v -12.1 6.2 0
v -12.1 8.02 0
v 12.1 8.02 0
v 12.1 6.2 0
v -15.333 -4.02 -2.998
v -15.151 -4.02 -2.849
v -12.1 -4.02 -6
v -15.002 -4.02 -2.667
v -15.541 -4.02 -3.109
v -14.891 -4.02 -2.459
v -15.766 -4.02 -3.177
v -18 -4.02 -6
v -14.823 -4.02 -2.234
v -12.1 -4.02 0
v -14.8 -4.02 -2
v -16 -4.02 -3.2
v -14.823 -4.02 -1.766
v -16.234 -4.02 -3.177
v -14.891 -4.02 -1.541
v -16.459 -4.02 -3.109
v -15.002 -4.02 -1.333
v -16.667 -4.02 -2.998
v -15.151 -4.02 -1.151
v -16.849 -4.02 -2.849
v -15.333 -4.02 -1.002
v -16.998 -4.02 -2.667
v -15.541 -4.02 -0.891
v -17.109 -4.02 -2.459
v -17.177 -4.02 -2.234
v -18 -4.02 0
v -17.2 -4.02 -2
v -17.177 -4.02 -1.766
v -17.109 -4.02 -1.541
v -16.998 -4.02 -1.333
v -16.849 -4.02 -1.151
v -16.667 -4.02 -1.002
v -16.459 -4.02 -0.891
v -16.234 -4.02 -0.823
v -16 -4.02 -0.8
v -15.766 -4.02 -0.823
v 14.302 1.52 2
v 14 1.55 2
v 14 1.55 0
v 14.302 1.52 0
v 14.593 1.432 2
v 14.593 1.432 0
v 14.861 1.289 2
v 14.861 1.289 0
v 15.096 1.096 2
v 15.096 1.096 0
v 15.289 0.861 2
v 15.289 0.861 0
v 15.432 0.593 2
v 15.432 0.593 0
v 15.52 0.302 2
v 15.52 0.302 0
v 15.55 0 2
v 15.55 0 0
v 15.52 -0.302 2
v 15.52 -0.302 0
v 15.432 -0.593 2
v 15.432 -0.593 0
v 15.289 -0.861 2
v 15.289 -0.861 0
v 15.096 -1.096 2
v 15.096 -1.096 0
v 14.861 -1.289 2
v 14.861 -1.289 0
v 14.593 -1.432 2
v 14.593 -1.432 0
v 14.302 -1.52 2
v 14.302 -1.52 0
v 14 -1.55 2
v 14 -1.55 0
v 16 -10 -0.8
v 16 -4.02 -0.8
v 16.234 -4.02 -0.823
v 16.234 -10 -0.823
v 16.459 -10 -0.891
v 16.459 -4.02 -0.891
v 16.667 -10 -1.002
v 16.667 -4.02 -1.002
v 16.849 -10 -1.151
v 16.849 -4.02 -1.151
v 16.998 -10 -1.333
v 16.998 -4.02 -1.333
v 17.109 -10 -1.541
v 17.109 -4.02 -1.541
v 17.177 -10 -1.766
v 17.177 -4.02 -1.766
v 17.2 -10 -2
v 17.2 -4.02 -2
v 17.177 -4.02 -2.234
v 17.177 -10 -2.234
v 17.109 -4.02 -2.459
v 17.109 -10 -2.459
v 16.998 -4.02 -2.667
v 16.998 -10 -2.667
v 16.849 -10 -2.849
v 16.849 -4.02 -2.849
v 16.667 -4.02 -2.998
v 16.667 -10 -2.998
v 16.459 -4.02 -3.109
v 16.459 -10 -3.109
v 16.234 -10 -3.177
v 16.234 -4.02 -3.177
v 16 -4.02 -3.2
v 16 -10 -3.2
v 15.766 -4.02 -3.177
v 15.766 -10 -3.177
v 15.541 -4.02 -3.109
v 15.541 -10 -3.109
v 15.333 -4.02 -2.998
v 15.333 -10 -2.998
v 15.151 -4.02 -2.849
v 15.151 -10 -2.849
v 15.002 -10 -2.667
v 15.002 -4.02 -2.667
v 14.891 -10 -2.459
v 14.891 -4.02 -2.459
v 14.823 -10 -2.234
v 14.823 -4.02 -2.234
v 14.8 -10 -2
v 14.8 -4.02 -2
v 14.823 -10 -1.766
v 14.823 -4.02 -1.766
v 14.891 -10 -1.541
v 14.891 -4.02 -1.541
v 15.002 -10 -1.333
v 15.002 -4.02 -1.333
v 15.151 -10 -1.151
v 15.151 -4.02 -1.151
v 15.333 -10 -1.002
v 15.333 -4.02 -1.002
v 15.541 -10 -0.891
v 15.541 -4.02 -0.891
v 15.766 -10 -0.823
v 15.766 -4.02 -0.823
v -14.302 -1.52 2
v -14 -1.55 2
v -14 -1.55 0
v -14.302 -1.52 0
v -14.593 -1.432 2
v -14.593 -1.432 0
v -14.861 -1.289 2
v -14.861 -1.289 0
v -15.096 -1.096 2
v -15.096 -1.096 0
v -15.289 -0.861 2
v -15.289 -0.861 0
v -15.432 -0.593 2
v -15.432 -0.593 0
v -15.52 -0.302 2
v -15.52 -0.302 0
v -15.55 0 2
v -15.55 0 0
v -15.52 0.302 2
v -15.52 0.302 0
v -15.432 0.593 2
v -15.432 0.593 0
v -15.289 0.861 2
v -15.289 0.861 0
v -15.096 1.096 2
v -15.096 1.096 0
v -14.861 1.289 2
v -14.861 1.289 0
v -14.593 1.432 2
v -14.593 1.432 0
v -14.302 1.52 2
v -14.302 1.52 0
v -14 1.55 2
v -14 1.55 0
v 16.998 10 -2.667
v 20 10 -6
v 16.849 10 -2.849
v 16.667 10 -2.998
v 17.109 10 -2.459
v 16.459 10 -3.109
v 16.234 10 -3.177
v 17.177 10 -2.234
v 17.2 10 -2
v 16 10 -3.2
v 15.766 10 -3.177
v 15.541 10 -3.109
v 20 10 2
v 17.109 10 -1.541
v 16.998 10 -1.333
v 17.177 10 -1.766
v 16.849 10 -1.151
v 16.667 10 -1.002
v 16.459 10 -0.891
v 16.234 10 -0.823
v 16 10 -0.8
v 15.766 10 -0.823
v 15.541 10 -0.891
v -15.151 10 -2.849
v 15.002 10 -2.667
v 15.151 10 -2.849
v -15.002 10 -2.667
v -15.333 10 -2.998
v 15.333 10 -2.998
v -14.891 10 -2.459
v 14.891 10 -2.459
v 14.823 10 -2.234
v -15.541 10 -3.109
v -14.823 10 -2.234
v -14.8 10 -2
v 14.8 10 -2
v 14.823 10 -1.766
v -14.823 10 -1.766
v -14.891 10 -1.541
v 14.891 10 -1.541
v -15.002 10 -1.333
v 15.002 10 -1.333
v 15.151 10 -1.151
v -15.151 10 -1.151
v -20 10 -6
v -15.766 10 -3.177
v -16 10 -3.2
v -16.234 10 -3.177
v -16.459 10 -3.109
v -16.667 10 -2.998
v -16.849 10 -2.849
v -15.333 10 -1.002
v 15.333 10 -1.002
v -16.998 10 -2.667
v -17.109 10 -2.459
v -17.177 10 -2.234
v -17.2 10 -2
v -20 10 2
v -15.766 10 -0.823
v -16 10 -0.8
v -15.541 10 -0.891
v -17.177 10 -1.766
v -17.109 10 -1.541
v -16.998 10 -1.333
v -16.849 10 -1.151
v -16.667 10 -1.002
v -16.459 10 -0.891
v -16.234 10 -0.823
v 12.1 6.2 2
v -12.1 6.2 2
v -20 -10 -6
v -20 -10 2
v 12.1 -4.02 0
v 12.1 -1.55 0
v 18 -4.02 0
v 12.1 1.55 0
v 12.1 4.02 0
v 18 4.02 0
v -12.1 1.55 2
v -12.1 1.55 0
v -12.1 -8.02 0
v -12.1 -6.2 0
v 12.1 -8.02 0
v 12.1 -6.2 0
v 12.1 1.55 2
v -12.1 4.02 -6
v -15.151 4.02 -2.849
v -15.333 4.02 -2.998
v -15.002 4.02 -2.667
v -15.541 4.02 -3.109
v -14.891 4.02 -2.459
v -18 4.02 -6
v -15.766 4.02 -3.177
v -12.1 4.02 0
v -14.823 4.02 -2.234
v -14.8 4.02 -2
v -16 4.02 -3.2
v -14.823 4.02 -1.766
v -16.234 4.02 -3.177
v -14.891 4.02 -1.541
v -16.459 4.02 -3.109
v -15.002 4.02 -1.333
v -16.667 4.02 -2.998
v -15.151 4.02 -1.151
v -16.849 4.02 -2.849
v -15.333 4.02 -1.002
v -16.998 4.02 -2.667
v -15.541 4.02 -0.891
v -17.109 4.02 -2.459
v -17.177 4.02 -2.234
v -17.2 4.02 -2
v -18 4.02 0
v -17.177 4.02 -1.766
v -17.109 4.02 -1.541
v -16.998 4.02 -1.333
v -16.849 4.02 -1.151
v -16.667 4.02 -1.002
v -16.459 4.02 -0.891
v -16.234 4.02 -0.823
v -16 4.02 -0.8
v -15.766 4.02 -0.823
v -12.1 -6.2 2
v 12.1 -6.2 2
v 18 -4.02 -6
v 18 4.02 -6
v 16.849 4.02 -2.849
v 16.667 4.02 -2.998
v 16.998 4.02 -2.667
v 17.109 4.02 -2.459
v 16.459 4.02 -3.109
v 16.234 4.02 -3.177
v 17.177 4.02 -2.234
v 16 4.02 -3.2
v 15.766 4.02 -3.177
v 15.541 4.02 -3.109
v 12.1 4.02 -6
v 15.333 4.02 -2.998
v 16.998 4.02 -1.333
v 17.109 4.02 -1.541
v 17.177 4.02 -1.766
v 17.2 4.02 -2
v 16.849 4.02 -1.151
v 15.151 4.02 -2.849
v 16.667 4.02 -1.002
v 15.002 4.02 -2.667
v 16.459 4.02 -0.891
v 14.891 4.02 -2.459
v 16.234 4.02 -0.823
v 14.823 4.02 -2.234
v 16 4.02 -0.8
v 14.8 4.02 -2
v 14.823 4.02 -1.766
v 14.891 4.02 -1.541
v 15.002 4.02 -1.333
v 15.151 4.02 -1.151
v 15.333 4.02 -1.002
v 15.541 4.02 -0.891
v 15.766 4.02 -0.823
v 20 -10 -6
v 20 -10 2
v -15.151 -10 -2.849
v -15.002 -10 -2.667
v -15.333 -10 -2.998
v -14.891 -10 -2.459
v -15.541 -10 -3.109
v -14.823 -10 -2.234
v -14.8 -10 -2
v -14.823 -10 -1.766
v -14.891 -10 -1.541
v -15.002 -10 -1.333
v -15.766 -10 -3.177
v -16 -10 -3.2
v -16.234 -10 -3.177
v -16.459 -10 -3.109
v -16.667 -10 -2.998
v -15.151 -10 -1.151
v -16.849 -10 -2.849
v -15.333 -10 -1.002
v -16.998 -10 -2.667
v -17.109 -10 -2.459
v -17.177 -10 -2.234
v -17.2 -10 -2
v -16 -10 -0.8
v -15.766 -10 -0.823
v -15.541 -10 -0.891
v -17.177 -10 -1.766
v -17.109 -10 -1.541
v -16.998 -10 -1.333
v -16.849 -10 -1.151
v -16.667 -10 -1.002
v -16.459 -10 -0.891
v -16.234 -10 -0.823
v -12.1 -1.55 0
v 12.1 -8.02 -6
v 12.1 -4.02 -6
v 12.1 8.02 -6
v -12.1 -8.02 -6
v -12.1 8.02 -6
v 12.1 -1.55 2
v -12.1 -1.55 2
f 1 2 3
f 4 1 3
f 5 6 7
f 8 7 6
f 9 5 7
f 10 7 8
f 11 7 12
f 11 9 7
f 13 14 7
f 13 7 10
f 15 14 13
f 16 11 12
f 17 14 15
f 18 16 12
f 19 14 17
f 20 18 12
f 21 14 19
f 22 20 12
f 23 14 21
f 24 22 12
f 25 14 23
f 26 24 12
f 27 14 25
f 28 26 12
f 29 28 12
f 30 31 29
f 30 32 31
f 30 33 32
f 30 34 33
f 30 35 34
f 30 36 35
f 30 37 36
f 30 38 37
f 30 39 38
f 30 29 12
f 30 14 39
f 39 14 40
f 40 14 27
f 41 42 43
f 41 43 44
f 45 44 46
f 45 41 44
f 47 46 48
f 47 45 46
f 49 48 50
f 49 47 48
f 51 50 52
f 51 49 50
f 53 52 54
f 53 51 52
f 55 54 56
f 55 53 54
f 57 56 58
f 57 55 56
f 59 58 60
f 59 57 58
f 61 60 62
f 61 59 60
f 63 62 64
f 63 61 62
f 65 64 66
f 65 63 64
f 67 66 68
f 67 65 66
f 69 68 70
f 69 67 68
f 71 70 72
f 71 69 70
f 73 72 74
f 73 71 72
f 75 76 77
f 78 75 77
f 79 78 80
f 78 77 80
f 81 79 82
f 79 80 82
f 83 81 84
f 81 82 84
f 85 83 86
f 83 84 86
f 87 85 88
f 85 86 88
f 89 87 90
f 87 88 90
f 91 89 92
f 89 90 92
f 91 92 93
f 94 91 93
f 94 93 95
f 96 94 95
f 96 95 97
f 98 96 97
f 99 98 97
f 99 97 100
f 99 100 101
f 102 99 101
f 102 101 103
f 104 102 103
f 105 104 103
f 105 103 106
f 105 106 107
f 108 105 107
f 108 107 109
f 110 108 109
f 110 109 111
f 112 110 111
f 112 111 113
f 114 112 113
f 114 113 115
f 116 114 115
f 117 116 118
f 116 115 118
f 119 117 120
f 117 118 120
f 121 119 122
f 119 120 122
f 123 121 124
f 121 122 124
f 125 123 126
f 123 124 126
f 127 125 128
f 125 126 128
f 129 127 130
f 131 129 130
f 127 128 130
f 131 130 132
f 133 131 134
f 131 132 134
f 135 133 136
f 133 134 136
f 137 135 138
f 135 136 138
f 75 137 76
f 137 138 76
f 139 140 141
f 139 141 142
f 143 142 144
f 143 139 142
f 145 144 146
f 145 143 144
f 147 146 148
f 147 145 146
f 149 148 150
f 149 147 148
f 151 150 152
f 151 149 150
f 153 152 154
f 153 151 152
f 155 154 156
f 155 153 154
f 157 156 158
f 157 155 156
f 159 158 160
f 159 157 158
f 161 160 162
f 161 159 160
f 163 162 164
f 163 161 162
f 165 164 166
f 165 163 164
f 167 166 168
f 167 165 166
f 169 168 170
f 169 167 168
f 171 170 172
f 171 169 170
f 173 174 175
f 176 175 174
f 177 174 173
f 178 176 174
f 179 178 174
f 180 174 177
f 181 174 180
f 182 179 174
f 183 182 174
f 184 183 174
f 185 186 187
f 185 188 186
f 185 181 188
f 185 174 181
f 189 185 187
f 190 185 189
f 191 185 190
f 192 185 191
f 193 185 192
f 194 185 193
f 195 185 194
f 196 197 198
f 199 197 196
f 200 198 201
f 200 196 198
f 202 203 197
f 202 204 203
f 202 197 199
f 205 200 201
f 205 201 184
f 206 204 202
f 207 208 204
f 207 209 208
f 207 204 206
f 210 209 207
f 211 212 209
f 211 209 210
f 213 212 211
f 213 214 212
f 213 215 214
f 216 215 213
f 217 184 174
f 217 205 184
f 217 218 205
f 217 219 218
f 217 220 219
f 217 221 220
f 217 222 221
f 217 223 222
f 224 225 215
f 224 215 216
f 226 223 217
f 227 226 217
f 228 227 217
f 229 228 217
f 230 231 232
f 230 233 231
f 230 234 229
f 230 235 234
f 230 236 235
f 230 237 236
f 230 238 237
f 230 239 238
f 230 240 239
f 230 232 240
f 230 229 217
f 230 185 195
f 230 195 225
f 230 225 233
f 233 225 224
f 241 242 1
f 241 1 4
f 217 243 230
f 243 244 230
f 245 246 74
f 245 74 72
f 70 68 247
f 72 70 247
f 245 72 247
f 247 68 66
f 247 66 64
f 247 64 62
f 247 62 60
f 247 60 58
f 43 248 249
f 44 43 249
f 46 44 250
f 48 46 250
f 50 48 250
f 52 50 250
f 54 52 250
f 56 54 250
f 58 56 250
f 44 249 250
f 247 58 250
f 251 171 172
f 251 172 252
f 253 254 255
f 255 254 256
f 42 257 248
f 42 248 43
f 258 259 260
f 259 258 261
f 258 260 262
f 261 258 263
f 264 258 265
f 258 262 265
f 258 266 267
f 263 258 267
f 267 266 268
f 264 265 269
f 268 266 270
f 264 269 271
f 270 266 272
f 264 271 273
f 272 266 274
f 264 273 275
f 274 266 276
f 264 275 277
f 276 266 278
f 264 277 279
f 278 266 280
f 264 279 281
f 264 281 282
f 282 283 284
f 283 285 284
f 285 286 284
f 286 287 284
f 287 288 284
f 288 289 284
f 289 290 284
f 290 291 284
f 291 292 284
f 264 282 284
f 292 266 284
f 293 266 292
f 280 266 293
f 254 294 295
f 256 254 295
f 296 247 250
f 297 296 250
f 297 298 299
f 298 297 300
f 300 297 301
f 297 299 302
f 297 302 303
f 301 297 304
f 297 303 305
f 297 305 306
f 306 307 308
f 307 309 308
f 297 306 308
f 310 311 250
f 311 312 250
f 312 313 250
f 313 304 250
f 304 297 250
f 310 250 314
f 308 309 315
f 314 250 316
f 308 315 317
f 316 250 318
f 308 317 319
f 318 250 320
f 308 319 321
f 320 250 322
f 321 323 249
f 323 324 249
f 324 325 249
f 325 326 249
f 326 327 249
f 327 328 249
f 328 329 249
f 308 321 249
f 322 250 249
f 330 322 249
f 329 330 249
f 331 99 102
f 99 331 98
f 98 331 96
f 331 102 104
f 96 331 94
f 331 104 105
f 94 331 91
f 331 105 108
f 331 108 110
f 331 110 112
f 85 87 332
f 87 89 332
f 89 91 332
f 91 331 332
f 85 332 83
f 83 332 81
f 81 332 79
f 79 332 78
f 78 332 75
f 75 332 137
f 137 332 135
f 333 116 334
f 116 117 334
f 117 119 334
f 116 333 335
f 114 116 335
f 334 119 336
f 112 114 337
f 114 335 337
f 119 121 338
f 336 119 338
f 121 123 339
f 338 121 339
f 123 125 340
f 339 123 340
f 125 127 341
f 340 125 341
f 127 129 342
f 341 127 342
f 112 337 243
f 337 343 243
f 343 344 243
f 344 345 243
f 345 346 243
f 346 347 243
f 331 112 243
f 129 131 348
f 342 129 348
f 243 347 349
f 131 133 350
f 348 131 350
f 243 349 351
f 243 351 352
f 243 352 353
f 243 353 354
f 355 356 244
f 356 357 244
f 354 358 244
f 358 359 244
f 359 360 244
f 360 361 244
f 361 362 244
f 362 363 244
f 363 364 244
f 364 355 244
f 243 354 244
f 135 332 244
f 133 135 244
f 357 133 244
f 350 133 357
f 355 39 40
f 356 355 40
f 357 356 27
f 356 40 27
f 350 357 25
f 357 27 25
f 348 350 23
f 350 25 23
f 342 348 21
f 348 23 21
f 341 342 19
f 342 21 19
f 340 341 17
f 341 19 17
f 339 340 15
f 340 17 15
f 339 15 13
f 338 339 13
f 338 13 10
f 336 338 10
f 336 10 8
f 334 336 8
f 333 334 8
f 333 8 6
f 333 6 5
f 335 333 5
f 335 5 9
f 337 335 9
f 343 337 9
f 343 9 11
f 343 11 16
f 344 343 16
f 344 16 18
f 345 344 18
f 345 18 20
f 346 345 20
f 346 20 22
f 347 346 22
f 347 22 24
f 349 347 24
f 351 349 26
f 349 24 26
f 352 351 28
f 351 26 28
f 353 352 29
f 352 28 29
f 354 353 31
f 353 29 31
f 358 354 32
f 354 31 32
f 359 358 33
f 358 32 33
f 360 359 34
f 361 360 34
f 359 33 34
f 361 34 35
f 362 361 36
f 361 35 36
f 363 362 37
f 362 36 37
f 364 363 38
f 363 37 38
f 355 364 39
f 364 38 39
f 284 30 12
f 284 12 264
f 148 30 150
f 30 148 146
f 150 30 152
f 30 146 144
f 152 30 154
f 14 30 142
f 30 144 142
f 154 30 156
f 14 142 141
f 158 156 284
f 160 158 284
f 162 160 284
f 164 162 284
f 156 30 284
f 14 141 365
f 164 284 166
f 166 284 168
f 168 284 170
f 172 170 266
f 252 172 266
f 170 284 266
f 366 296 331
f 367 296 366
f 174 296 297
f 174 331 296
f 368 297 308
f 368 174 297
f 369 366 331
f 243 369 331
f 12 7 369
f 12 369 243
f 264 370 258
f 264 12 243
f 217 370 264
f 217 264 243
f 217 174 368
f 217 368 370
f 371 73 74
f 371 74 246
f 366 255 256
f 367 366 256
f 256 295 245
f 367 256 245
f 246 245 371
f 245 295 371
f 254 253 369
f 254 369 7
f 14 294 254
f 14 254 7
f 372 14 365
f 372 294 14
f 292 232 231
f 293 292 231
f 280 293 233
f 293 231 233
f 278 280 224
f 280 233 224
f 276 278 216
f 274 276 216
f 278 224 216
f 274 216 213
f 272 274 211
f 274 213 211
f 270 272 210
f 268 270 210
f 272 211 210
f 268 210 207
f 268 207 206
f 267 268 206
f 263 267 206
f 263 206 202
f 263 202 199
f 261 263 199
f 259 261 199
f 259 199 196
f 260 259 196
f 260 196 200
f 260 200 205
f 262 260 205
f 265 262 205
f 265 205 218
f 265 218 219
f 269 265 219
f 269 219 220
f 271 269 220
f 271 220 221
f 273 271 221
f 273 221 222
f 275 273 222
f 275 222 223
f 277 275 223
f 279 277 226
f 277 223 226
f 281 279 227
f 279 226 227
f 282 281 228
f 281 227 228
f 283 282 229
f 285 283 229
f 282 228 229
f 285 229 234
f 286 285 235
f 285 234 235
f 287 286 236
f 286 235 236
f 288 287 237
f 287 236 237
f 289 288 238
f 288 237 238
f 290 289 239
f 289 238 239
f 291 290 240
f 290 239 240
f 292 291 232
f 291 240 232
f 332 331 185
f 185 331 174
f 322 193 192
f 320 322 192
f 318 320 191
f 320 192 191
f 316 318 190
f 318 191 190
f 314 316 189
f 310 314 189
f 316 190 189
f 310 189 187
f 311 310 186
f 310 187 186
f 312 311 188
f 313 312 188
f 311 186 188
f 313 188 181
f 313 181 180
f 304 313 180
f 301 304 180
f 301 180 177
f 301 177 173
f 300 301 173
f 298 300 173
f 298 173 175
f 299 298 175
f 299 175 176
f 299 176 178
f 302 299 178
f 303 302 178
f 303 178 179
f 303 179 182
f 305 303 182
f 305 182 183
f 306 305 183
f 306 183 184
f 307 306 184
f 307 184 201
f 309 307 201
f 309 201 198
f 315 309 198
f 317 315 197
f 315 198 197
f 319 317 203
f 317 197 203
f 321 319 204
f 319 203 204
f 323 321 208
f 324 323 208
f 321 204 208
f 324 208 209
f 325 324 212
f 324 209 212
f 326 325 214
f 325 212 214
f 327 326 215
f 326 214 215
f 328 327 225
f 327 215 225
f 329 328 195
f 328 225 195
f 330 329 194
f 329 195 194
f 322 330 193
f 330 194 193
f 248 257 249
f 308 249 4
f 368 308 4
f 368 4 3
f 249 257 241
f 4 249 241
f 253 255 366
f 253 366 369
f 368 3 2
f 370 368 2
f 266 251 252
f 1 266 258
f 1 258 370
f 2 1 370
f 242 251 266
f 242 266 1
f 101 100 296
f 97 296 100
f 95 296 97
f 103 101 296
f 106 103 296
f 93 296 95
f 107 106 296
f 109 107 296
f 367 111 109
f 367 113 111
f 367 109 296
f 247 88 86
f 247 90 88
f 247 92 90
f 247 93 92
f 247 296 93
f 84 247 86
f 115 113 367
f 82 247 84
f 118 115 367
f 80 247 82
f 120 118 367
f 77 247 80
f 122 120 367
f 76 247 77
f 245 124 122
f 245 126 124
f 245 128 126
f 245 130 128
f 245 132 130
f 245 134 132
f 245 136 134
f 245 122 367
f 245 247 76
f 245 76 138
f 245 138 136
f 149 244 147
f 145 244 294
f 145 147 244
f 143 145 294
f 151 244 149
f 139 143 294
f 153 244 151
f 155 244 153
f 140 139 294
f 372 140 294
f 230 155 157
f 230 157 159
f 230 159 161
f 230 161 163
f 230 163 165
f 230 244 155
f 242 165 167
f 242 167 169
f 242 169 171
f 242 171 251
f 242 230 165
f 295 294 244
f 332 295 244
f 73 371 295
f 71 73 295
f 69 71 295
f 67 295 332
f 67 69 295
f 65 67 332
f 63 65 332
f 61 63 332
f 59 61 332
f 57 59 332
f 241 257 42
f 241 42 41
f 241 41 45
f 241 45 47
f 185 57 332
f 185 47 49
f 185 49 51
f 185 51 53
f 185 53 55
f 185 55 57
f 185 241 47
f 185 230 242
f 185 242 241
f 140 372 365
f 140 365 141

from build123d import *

# Parameters (mm, degrees)
SKETCH_1_W          = 40
SKETCH_1_H          = 20
EXTRUDE_1_DEPTH     = 2
SKETCH_2_W          = 24.2
SKETCH_2_H          = 12.4
CUT_EXTRUDE_1_DEPTH = 2
SKETCH_3_W          = 2
SKETCH_3_H          = 20
EXTRUDE_2_DEPTH     = 6
SKETCH_5_W          = 36
SKETCH_5_H          = 1.98
EXTRUDE_3_DEPTH     = 6
SKETCH_6_W          = 5.9
SKETCH_6_H          = 4
EXTRUDE_4_DEPTH     = 6
SKETCH_7_R          = 1.2
CUT_EXTRUDE_2_DEPTH = 29.91366459


with BuildPart() as part:
    # ｽｹｯﾁ1 → ﾎﾞｽ - 押し出し1 (new body)
    with BuildSketch(Plane.XY):
        Rectangle(SKETCH_1_W, SKETCH_1_H)
    extrude(amount=EXTRUDE_1_DEPTH)

    # ｽｹｯﾁ2 → ｶｯﾄ - 押し出し1 (cut)
    with BuildSketch(Plane.XY.offset(2)):
        Rectangle(SKETCH_2_W, SKETCH_2_H)
        with BuildLine():
            Line((-14, 1.55), (14, 1.55))
            ThreePointArc((14, 1.55), (15.55, 0), (14, -1.55))
            Line((14, -1.55), (-14, -1.55))
            ThreePointArc((-14, -1.55), (-15.55, 0), (-14, 1.55))
        make_face()
    extrude(amount=-CUT_EXTRUDE_1_DEPTH, mode=Mode.SUBTRACT)

    # ｽｹｯﾁ3 → ﾎﾞｽ - 押し出し2 (add)
    with BuildSketch(Plane(origin=(0, 0, 0), x_dir=(-1, 0, 0), z_dir=(0, 0, -1))):
        with Locations((19, 0)):
            Rectangle(SKETCH_3_W, SKETCH_3_H)
        with Locations((-19, 0)):
            Rectangle(SKETCH_3_W, SKETCH_3_H)
    extrude(amount=EXTRUDE_2_DEPTH)

    # ｽｹｯﾁ5 → ﾎﾞｽ - 押し出し3 (add)
    with BuildSketch(Plane(origin=(0, 0, 0), x_dir=(-1, 0, 0), z_dir=(0, 0, -1))):
        with Locations((0, 9.01)):
            Rectangle(SKETCH_5_W, SKETCH_5_H)
        with Locations((0, -9.01)):
            Rectangle(SKETCH_5_W, SKETCH_5_H)
    extrude(amount=EXTRUDE_3_DEPTH)

    # ｽｹｯﾁ6 → ﾎﾞｽ - 押し出し4 (add)
    with BuildSketch(Plane(origin=(0, 0, 0), x_dir=(-1, 0, 0), z_dir=(0, 0, -1))):
        with Locations((-15.05, 6.02)):
            Rectangle(SKETCH_6_W, SKETCH_6_H)
        with Locations((15.05, 6.02)):
            Rectangle(SKETCH_6_W, SKETCH_6_H)
        with Locations((15.05, -6.02)):
            Rectangle(SKETCH_6_W, SKETCH_6_H)
        with Locations((-15.05, -6.02)):
            Rectangle(SKETCH_6_W, SKETCH_6_H)
    extrude(amount=EXTRUDE_4_DEPTH)

    # ｽｹｯﾁ7 → ｶｯﾄ - 押し出し2 (cut, through all)
    with BuildSketch(Plane(origin=(0, 10, 0), x_dir=(1, 0, 0), z_dir=(0, 1, 0))):
        with Locations(Location((-16, 2, 0), (0, 0, 270))):
            Circle(SKETCH_7_R)
        with Locations(Location((16, 2, 0), (0, 0, 270))):
            Circle(SKETCH_7_R)
    extrude(amount=-CUT_EXTRUDE_2_DEPTH, mode=Mode.SUBTRACT)


solid = part.part
